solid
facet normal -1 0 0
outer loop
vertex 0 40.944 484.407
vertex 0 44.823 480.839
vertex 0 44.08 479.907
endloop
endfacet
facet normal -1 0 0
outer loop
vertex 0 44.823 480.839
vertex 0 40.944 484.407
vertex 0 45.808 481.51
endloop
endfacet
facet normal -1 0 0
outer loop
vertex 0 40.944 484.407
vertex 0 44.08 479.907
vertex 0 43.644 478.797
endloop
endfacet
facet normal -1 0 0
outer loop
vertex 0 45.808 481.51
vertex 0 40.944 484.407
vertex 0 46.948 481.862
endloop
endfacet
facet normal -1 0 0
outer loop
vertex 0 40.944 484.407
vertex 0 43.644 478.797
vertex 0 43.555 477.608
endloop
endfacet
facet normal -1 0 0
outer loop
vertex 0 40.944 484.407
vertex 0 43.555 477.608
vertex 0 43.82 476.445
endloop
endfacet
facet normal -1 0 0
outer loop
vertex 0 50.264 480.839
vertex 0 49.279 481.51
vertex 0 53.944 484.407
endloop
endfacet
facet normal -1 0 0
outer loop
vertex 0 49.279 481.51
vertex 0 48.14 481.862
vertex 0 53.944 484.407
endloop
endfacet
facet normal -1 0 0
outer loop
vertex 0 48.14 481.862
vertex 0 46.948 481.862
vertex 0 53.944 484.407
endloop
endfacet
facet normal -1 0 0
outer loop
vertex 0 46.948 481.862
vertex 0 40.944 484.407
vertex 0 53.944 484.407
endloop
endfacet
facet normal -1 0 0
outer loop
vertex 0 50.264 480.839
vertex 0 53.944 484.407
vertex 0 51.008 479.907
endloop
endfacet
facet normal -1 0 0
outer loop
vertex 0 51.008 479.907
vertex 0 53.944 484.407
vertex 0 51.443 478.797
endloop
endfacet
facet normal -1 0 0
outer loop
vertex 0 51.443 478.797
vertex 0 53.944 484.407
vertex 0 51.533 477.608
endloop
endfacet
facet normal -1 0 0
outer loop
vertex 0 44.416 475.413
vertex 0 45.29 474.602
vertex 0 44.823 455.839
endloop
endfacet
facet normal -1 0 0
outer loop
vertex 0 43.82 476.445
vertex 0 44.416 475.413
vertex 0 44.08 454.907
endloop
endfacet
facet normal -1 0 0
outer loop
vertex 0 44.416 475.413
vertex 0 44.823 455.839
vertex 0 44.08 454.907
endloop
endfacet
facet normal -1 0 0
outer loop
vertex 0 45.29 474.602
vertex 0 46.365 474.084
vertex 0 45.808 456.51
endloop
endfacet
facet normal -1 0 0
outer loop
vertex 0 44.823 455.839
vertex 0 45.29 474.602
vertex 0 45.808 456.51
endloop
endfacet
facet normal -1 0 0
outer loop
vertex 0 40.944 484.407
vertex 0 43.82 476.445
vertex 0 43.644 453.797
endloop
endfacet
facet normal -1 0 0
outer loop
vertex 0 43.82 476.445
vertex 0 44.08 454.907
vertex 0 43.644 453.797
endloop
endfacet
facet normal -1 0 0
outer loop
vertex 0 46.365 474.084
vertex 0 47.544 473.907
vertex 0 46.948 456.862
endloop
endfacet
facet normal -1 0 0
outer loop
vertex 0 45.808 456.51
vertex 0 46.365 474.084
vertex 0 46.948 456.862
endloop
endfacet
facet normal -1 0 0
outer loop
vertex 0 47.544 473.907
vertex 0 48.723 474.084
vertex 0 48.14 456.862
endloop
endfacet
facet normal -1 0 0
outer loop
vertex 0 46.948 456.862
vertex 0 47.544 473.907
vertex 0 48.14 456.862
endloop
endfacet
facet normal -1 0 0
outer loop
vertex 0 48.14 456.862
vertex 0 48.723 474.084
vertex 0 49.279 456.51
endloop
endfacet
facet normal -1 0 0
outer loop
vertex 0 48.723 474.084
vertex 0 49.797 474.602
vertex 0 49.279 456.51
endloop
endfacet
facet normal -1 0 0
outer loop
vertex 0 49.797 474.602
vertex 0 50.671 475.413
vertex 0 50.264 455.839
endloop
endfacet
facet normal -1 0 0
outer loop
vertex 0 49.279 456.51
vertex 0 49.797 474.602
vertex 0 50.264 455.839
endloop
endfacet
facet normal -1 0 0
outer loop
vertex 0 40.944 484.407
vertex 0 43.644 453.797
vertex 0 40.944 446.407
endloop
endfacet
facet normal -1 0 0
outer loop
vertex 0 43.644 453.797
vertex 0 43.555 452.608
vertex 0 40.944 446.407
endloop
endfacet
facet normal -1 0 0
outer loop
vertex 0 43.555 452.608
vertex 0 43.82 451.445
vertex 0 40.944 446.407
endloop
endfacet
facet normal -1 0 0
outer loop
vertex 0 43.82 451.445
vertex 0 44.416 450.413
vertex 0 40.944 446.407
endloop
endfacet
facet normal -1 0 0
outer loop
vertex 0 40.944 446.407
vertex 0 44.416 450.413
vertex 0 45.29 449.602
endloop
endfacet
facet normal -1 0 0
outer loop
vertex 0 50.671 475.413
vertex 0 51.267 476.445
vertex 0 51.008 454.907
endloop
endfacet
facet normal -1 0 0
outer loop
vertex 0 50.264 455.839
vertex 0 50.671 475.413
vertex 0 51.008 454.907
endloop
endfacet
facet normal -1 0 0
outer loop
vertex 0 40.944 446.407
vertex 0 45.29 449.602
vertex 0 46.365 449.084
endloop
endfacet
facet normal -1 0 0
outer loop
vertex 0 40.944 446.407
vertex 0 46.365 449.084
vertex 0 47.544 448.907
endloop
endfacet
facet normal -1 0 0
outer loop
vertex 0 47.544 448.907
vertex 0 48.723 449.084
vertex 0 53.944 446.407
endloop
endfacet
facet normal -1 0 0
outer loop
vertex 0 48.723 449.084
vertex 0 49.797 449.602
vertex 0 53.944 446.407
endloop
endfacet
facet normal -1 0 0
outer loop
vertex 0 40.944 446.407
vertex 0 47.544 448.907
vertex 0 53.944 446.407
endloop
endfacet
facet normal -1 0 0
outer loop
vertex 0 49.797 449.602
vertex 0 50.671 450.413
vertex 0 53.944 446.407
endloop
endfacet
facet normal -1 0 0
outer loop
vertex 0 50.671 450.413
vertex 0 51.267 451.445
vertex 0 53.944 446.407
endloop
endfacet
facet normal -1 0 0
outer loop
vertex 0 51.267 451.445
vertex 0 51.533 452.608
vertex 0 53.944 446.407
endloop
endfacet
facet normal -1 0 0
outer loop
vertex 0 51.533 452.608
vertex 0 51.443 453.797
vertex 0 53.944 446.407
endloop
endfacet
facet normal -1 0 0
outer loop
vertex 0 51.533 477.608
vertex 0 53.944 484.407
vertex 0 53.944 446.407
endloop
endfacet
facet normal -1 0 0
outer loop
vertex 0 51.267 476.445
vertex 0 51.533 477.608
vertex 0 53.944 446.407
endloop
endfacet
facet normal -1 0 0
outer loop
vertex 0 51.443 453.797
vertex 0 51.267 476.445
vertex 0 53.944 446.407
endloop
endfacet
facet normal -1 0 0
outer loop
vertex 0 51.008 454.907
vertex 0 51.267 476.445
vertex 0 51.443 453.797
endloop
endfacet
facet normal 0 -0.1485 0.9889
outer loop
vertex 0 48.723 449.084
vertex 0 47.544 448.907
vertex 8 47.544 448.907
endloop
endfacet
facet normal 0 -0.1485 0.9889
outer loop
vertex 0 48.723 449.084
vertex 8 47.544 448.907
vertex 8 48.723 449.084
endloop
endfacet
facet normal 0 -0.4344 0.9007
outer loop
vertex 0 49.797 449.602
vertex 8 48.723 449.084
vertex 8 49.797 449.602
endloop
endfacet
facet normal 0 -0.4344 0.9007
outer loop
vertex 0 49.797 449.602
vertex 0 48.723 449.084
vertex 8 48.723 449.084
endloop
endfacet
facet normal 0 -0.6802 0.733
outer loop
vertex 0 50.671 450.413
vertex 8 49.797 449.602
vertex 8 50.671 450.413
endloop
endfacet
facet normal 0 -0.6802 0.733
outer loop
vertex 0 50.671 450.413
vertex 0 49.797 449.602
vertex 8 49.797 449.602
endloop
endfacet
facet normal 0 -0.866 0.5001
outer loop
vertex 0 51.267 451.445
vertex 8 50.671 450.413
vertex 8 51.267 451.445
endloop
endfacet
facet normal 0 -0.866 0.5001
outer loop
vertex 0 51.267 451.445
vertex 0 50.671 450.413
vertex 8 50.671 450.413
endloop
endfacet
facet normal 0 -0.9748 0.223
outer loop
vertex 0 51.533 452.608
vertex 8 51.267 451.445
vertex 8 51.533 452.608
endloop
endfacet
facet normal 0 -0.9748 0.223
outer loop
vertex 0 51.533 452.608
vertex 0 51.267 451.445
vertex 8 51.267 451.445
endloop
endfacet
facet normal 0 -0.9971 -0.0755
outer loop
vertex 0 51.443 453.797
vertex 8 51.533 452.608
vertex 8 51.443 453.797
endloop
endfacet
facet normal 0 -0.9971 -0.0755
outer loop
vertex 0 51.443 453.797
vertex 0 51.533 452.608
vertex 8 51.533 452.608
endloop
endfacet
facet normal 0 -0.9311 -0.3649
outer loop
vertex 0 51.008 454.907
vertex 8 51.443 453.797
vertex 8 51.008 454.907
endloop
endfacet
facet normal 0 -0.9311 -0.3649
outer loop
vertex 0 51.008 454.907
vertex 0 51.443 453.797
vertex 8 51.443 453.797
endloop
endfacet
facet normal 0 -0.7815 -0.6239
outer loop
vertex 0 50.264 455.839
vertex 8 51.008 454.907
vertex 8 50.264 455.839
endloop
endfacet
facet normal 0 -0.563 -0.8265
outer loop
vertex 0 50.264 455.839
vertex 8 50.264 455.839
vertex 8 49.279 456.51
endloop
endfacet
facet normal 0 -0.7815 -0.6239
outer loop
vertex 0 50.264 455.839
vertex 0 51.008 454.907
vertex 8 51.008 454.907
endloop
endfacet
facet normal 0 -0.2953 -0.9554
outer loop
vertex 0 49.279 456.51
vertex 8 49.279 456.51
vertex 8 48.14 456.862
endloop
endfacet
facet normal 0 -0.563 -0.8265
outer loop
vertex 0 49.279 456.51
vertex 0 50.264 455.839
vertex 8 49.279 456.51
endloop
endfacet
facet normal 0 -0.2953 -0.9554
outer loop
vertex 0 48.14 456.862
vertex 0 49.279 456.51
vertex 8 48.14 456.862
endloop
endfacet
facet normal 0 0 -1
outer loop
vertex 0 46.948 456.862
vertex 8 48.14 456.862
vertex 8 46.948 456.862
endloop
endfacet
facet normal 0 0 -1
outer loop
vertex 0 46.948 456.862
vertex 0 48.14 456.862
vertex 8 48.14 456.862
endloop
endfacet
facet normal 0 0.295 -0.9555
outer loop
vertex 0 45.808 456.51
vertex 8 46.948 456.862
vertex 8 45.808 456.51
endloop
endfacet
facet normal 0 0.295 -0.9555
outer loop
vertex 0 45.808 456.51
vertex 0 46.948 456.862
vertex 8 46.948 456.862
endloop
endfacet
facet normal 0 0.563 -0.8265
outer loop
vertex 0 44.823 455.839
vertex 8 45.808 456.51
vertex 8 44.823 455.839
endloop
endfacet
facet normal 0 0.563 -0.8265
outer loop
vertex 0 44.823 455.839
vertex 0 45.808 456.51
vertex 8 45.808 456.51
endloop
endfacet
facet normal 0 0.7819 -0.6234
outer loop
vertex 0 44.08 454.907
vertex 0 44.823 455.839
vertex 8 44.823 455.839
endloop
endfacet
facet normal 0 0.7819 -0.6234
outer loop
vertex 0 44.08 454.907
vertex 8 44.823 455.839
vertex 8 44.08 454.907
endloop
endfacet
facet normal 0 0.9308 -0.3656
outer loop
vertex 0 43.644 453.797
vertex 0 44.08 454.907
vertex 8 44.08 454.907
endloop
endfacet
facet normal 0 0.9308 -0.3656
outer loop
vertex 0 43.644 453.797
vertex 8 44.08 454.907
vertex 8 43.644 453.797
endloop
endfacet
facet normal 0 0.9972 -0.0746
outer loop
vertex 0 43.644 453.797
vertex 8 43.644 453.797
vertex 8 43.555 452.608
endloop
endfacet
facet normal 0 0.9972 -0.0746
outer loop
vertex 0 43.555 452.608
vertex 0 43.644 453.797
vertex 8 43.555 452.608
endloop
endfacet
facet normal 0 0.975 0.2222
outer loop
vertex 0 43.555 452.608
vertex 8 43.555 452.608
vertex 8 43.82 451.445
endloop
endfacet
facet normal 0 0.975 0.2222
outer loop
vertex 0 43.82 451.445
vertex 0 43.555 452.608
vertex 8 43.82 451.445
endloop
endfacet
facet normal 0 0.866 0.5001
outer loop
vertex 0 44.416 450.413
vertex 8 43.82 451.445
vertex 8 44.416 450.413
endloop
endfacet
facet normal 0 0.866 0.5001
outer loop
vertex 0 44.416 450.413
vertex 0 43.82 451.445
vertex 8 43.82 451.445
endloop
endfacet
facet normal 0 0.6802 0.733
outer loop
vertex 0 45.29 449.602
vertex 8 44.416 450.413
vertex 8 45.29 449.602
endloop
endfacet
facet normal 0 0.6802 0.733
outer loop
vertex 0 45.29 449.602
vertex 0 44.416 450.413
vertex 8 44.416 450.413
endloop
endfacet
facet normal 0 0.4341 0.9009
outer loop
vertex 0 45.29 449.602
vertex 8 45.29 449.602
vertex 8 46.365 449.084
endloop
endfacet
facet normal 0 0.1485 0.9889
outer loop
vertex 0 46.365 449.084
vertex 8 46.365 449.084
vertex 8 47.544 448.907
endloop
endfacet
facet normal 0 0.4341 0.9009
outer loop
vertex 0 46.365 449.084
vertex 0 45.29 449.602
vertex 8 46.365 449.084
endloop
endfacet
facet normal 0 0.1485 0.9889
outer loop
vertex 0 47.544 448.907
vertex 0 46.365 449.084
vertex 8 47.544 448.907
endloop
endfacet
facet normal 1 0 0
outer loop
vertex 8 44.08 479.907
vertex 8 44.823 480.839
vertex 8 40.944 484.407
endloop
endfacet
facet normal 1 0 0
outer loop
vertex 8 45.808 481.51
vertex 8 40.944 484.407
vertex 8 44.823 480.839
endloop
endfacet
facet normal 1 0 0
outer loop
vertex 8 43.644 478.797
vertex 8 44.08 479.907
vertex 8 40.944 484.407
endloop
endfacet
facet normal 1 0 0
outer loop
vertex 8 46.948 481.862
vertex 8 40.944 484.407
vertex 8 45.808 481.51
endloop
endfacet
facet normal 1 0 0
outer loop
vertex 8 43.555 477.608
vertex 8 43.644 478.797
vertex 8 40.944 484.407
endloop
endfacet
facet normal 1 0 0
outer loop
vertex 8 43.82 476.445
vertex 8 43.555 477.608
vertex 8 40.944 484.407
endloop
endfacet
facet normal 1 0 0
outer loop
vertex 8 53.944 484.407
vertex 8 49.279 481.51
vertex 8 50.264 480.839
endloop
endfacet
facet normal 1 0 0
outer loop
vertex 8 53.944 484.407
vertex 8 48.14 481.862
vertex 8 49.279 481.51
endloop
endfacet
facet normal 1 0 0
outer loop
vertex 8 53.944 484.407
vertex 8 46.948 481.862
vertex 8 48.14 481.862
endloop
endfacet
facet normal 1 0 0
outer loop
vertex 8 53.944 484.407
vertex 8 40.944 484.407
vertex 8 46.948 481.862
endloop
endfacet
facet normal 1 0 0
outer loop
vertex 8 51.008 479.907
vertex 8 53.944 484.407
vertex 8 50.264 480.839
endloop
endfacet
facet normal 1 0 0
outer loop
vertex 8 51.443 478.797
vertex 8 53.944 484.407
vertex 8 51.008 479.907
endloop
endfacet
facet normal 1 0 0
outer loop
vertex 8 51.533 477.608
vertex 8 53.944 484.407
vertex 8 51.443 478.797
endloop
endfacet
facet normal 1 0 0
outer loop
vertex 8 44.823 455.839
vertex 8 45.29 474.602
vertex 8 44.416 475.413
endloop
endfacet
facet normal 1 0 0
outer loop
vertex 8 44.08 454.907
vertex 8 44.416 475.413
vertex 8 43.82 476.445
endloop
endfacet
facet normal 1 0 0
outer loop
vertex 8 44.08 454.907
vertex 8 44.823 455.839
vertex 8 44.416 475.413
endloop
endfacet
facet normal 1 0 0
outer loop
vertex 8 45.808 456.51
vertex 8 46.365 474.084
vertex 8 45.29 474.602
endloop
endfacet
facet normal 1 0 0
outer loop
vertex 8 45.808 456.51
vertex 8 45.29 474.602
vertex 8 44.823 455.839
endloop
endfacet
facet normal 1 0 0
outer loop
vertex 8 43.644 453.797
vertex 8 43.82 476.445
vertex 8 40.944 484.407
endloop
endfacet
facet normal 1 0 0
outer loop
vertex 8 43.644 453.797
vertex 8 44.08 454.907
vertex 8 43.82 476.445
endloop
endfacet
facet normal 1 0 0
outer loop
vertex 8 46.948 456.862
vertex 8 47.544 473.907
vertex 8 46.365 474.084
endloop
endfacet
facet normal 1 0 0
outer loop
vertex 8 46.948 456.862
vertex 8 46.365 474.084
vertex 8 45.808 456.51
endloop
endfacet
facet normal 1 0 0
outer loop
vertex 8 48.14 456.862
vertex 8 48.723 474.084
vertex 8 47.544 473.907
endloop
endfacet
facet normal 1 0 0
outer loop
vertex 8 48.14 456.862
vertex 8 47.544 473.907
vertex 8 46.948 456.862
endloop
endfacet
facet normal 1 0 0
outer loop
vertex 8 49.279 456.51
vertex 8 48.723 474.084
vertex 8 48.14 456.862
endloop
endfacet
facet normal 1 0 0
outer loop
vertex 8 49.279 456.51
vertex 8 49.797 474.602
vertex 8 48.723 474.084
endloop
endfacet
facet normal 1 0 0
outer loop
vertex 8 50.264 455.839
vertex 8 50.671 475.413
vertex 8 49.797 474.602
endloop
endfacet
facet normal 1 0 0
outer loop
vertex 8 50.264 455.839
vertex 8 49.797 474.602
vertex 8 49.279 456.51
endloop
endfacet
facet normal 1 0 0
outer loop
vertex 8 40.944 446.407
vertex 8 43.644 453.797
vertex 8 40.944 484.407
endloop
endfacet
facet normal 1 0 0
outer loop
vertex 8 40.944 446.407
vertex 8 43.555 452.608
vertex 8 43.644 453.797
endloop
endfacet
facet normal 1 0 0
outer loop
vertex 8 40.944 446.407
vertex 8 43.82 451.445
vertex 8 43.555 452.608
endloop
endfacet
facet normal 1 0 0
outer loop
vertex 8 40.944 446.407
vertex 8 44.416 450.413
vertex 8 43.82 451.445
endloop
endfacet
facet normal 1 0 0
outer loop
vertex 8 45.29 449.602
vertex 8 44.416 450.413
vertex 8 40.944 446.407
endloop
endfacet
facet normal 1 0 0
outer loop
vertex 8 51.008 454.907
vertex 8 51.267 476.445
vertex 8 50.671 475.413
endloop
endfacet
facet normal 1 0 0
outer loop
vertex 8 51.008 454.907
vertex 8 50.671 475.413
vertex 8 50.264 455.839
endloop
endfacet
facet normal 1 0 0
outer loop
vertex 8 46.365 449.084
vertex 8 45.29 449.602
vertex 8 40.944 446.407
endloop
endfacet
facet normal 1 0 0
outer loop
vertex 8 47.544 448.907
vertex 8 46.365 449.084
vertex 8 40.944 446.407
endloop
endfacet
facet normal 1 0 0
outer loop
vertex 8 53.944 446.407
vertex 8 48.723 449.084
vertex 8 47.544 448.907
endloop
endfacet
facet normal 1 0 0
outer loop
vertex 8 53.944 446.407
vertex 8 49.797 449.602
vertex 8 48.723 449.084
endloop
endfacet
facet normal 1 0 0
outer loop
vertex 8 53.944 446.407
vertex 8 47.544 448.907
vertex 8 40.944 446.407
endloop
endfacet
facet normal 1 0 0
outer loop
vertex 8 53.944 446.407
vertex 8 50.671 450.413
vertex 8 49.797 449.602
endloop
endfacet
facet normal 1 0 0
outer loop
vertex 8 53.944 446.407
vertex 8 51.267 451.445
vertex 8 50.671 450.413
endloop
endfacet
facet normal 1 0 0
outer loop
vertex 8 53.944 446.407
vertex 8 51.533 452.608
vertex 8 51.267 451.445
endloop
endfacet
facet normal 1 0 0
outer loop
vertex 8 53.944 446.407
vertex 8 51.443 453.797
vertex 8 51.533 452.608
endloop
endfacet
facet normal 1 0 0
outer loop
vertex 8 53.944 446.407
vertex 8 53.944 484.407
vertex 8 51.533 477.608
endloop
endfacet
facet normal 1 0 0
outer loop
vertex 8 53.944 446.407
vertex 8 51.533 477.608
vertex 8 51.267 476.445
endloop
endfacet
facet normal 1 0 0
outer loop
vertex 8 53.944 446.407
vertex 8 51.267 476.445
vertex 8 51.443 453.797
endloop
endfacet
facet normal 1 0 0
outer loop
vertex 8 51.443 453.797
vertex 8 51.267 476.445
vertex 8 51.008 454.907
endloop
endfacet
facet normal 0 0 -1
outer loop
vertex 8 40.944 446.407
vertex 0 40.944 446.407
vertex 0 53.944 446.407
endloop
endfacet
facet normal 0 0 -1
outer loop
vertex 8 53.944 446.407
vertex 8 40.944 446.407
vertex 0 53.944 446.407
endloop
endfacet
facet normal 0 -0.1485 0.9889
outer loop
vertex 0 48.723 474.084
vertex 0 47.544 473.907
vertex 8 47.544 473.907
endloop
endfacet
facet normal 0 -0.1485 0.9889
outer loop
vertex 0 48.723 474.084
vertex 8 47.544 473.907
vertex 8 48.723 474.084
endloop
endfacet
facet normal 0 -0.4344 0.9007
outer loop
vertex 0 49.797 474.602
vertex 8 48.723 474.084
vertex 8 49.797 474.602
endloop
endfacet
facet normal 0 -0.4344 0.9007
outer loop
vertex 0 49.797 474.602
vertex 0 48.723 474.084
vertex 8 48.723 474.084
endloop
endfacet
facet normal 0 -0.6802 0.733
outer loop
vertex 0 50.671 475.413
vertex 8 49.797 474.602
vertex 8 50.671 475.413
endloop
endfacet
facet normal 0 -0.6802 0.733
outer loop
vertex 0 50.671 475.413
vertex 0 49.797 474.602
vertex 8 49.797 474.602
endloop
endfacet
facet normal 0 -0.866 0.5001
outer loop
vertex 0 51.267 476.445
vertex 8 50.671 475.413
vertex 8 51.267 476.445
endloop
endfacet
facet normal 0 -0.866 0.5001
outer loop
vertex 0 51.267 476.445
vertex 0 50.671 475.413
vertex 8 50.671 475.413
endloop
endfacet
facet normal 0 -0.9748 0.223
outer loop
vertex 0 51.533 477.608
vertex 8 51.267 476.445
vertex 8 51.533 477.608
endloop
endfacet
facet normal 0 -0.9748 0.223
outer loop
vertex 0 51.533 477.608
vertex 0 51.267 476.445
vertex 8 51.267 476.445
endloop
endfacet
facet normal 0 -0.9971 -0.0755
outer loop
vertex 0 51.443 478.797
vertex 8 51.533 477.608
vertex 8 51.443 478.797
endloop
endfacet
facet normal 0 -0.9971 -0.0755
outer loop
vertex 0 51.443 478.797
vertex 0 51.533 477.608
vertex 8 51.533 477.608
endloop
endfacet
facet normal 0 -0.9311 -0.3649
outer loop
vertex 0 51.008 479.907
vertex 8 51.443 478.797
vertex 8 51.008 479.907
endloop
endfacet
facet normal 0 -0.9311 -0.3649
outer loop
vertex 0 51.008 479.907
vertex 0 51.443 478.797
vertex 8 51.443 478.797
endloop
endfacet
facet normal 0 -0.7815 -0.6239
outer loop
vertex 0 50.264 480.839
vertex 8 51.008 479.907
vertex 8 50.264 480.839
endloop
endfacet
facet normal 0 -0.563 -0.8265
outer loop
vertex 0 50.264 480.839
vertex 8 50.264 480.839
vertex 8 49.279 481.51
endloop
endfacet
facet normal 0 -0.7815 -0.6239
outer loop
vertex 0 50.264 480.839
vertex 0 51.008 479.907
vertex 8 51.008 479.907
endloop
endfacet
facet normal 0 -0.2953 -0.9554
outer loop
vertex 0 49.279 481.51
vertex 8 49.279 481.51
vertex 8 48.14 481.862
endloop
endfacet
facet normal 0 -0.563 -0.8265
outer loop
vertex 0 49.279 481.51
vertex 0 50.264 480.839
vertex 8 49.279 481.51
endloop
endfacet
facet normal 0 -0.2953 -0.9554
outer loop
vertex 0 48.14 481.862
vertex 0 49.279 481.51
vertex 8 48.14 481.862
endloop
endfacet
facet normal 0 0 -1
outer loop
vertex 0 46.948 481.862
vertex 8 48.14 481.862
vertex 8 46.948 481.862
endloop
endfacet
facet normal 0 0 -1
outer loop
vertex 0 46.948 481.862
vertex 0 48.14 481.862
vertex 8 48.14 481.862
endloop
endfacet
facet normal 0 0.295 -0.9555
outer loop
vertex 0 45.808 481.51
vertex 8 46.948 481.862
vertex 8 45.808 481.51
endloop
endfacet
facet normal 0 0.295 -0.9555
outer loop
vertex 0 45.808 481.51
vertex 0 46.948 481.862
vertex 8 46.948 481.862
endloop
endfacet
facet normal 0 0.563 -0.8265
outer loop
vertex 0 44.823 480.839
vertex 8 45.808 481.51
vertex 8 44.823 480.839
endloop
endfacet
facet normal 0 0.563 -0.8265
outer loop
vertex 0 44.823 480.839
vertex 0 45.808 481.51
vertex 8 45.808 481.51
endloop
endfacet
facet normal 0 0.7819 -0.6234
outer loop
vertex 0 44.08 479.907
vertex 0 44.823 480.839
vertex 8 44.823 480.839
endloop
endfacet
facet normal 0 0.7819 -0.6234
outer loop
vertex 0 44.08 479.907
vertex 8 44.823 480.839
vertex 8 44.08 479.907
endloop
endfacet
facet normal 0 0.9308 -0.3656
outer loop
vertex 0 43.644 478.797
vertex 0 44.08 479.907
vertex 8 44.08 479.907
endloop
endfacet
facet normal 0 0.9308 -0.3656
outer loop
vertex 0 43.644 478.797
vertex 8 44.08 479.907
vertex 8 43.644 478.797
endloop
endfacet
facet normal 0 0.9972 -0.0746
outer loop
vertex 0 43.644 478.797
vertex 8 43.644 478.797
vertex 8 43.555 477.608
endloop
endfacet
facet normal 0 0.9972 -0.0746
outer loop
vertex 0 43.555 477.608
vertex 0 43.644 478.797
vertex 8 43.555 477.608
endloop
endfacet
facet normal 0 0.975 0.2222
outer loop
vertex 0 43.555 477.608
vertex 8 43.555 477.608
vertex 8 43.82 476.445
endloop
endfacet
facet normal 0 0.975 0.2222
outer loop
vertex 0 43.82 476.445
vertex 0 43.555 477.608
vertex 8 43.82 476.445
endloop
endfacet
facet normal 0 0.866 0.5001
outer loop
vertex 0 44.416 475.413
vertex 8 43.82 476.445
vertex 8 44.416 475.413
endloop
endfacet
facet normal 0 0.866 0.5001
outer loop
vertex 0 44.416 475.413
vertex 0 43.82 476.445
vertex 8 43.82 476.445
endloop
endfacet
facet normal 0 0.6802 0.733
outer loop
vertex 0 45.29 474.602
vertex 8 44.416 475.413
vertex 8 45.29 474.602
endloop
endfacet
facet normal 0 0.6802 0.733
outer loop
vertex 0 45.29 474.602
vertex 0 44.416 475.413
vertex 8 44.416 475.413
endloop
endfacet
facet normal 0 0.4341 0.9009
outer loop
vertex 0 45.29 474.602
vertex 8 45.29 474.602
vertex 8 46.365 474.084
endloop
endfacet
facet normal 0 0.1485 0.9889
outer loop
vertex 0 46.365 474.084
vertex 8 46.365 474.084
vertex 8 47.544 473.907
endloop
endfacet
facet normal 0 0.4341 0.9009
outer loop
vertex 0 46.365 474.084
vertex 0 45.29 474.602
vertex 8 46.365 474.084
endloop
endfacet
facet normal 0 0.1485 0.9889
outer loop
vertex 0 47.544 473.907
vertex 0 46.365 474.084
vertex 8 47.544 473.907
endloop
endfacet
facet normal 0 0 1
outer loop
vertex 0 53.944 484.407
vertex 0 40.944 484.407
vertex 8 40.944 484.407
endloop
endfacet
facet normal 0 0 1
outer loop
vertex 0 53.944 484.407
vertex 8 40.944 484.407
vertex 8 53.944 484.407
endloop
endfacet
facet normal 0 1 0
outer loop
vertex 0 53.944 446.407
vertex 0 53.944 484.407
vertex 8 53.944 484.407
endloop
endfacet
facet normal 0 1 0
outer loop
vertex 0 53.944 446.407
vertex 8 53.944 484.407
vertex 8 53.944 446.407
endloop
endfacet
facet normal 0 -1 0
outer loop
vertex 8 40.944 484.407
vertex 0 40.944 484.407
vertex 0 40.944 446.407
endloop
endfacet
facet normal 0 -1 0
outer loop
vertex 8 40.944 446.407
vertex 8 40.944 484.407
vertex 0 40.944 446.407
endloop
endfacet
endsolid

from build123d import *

# Parameters (mm, degrees)
SKETCH1_W           = 38
SKETCH1_H           = 13
SKETCH1_R           = 4
BOSS_EXTRUDE1_DEPTH = 8


with BuildPart() as part:
    # Sketch1 → Boss-Extrude1 (new body)
    with BuildSketch(Plane(origin=(0, 0, 0), x_dir=(0, 0, -1), z_dir=(1, 0, 0))):
        with Locations((-465.406543956, 47.44372232)):
            Rectangle(SKETCH1_W, SKETCH1_H)
        with Locations((-477.906543956, 47.54372232)):
            Circle(SKETCH1_R, mode=Mode.SUBTRACT)
        with Locations((-452.906543956, 47.54372232)):
            Circle(SKETCH1_R, mode=Mode.SUBTRACT)
    extrude(amount=BOSS_EXTRUDE1_DEPTH)


solid = part.part
